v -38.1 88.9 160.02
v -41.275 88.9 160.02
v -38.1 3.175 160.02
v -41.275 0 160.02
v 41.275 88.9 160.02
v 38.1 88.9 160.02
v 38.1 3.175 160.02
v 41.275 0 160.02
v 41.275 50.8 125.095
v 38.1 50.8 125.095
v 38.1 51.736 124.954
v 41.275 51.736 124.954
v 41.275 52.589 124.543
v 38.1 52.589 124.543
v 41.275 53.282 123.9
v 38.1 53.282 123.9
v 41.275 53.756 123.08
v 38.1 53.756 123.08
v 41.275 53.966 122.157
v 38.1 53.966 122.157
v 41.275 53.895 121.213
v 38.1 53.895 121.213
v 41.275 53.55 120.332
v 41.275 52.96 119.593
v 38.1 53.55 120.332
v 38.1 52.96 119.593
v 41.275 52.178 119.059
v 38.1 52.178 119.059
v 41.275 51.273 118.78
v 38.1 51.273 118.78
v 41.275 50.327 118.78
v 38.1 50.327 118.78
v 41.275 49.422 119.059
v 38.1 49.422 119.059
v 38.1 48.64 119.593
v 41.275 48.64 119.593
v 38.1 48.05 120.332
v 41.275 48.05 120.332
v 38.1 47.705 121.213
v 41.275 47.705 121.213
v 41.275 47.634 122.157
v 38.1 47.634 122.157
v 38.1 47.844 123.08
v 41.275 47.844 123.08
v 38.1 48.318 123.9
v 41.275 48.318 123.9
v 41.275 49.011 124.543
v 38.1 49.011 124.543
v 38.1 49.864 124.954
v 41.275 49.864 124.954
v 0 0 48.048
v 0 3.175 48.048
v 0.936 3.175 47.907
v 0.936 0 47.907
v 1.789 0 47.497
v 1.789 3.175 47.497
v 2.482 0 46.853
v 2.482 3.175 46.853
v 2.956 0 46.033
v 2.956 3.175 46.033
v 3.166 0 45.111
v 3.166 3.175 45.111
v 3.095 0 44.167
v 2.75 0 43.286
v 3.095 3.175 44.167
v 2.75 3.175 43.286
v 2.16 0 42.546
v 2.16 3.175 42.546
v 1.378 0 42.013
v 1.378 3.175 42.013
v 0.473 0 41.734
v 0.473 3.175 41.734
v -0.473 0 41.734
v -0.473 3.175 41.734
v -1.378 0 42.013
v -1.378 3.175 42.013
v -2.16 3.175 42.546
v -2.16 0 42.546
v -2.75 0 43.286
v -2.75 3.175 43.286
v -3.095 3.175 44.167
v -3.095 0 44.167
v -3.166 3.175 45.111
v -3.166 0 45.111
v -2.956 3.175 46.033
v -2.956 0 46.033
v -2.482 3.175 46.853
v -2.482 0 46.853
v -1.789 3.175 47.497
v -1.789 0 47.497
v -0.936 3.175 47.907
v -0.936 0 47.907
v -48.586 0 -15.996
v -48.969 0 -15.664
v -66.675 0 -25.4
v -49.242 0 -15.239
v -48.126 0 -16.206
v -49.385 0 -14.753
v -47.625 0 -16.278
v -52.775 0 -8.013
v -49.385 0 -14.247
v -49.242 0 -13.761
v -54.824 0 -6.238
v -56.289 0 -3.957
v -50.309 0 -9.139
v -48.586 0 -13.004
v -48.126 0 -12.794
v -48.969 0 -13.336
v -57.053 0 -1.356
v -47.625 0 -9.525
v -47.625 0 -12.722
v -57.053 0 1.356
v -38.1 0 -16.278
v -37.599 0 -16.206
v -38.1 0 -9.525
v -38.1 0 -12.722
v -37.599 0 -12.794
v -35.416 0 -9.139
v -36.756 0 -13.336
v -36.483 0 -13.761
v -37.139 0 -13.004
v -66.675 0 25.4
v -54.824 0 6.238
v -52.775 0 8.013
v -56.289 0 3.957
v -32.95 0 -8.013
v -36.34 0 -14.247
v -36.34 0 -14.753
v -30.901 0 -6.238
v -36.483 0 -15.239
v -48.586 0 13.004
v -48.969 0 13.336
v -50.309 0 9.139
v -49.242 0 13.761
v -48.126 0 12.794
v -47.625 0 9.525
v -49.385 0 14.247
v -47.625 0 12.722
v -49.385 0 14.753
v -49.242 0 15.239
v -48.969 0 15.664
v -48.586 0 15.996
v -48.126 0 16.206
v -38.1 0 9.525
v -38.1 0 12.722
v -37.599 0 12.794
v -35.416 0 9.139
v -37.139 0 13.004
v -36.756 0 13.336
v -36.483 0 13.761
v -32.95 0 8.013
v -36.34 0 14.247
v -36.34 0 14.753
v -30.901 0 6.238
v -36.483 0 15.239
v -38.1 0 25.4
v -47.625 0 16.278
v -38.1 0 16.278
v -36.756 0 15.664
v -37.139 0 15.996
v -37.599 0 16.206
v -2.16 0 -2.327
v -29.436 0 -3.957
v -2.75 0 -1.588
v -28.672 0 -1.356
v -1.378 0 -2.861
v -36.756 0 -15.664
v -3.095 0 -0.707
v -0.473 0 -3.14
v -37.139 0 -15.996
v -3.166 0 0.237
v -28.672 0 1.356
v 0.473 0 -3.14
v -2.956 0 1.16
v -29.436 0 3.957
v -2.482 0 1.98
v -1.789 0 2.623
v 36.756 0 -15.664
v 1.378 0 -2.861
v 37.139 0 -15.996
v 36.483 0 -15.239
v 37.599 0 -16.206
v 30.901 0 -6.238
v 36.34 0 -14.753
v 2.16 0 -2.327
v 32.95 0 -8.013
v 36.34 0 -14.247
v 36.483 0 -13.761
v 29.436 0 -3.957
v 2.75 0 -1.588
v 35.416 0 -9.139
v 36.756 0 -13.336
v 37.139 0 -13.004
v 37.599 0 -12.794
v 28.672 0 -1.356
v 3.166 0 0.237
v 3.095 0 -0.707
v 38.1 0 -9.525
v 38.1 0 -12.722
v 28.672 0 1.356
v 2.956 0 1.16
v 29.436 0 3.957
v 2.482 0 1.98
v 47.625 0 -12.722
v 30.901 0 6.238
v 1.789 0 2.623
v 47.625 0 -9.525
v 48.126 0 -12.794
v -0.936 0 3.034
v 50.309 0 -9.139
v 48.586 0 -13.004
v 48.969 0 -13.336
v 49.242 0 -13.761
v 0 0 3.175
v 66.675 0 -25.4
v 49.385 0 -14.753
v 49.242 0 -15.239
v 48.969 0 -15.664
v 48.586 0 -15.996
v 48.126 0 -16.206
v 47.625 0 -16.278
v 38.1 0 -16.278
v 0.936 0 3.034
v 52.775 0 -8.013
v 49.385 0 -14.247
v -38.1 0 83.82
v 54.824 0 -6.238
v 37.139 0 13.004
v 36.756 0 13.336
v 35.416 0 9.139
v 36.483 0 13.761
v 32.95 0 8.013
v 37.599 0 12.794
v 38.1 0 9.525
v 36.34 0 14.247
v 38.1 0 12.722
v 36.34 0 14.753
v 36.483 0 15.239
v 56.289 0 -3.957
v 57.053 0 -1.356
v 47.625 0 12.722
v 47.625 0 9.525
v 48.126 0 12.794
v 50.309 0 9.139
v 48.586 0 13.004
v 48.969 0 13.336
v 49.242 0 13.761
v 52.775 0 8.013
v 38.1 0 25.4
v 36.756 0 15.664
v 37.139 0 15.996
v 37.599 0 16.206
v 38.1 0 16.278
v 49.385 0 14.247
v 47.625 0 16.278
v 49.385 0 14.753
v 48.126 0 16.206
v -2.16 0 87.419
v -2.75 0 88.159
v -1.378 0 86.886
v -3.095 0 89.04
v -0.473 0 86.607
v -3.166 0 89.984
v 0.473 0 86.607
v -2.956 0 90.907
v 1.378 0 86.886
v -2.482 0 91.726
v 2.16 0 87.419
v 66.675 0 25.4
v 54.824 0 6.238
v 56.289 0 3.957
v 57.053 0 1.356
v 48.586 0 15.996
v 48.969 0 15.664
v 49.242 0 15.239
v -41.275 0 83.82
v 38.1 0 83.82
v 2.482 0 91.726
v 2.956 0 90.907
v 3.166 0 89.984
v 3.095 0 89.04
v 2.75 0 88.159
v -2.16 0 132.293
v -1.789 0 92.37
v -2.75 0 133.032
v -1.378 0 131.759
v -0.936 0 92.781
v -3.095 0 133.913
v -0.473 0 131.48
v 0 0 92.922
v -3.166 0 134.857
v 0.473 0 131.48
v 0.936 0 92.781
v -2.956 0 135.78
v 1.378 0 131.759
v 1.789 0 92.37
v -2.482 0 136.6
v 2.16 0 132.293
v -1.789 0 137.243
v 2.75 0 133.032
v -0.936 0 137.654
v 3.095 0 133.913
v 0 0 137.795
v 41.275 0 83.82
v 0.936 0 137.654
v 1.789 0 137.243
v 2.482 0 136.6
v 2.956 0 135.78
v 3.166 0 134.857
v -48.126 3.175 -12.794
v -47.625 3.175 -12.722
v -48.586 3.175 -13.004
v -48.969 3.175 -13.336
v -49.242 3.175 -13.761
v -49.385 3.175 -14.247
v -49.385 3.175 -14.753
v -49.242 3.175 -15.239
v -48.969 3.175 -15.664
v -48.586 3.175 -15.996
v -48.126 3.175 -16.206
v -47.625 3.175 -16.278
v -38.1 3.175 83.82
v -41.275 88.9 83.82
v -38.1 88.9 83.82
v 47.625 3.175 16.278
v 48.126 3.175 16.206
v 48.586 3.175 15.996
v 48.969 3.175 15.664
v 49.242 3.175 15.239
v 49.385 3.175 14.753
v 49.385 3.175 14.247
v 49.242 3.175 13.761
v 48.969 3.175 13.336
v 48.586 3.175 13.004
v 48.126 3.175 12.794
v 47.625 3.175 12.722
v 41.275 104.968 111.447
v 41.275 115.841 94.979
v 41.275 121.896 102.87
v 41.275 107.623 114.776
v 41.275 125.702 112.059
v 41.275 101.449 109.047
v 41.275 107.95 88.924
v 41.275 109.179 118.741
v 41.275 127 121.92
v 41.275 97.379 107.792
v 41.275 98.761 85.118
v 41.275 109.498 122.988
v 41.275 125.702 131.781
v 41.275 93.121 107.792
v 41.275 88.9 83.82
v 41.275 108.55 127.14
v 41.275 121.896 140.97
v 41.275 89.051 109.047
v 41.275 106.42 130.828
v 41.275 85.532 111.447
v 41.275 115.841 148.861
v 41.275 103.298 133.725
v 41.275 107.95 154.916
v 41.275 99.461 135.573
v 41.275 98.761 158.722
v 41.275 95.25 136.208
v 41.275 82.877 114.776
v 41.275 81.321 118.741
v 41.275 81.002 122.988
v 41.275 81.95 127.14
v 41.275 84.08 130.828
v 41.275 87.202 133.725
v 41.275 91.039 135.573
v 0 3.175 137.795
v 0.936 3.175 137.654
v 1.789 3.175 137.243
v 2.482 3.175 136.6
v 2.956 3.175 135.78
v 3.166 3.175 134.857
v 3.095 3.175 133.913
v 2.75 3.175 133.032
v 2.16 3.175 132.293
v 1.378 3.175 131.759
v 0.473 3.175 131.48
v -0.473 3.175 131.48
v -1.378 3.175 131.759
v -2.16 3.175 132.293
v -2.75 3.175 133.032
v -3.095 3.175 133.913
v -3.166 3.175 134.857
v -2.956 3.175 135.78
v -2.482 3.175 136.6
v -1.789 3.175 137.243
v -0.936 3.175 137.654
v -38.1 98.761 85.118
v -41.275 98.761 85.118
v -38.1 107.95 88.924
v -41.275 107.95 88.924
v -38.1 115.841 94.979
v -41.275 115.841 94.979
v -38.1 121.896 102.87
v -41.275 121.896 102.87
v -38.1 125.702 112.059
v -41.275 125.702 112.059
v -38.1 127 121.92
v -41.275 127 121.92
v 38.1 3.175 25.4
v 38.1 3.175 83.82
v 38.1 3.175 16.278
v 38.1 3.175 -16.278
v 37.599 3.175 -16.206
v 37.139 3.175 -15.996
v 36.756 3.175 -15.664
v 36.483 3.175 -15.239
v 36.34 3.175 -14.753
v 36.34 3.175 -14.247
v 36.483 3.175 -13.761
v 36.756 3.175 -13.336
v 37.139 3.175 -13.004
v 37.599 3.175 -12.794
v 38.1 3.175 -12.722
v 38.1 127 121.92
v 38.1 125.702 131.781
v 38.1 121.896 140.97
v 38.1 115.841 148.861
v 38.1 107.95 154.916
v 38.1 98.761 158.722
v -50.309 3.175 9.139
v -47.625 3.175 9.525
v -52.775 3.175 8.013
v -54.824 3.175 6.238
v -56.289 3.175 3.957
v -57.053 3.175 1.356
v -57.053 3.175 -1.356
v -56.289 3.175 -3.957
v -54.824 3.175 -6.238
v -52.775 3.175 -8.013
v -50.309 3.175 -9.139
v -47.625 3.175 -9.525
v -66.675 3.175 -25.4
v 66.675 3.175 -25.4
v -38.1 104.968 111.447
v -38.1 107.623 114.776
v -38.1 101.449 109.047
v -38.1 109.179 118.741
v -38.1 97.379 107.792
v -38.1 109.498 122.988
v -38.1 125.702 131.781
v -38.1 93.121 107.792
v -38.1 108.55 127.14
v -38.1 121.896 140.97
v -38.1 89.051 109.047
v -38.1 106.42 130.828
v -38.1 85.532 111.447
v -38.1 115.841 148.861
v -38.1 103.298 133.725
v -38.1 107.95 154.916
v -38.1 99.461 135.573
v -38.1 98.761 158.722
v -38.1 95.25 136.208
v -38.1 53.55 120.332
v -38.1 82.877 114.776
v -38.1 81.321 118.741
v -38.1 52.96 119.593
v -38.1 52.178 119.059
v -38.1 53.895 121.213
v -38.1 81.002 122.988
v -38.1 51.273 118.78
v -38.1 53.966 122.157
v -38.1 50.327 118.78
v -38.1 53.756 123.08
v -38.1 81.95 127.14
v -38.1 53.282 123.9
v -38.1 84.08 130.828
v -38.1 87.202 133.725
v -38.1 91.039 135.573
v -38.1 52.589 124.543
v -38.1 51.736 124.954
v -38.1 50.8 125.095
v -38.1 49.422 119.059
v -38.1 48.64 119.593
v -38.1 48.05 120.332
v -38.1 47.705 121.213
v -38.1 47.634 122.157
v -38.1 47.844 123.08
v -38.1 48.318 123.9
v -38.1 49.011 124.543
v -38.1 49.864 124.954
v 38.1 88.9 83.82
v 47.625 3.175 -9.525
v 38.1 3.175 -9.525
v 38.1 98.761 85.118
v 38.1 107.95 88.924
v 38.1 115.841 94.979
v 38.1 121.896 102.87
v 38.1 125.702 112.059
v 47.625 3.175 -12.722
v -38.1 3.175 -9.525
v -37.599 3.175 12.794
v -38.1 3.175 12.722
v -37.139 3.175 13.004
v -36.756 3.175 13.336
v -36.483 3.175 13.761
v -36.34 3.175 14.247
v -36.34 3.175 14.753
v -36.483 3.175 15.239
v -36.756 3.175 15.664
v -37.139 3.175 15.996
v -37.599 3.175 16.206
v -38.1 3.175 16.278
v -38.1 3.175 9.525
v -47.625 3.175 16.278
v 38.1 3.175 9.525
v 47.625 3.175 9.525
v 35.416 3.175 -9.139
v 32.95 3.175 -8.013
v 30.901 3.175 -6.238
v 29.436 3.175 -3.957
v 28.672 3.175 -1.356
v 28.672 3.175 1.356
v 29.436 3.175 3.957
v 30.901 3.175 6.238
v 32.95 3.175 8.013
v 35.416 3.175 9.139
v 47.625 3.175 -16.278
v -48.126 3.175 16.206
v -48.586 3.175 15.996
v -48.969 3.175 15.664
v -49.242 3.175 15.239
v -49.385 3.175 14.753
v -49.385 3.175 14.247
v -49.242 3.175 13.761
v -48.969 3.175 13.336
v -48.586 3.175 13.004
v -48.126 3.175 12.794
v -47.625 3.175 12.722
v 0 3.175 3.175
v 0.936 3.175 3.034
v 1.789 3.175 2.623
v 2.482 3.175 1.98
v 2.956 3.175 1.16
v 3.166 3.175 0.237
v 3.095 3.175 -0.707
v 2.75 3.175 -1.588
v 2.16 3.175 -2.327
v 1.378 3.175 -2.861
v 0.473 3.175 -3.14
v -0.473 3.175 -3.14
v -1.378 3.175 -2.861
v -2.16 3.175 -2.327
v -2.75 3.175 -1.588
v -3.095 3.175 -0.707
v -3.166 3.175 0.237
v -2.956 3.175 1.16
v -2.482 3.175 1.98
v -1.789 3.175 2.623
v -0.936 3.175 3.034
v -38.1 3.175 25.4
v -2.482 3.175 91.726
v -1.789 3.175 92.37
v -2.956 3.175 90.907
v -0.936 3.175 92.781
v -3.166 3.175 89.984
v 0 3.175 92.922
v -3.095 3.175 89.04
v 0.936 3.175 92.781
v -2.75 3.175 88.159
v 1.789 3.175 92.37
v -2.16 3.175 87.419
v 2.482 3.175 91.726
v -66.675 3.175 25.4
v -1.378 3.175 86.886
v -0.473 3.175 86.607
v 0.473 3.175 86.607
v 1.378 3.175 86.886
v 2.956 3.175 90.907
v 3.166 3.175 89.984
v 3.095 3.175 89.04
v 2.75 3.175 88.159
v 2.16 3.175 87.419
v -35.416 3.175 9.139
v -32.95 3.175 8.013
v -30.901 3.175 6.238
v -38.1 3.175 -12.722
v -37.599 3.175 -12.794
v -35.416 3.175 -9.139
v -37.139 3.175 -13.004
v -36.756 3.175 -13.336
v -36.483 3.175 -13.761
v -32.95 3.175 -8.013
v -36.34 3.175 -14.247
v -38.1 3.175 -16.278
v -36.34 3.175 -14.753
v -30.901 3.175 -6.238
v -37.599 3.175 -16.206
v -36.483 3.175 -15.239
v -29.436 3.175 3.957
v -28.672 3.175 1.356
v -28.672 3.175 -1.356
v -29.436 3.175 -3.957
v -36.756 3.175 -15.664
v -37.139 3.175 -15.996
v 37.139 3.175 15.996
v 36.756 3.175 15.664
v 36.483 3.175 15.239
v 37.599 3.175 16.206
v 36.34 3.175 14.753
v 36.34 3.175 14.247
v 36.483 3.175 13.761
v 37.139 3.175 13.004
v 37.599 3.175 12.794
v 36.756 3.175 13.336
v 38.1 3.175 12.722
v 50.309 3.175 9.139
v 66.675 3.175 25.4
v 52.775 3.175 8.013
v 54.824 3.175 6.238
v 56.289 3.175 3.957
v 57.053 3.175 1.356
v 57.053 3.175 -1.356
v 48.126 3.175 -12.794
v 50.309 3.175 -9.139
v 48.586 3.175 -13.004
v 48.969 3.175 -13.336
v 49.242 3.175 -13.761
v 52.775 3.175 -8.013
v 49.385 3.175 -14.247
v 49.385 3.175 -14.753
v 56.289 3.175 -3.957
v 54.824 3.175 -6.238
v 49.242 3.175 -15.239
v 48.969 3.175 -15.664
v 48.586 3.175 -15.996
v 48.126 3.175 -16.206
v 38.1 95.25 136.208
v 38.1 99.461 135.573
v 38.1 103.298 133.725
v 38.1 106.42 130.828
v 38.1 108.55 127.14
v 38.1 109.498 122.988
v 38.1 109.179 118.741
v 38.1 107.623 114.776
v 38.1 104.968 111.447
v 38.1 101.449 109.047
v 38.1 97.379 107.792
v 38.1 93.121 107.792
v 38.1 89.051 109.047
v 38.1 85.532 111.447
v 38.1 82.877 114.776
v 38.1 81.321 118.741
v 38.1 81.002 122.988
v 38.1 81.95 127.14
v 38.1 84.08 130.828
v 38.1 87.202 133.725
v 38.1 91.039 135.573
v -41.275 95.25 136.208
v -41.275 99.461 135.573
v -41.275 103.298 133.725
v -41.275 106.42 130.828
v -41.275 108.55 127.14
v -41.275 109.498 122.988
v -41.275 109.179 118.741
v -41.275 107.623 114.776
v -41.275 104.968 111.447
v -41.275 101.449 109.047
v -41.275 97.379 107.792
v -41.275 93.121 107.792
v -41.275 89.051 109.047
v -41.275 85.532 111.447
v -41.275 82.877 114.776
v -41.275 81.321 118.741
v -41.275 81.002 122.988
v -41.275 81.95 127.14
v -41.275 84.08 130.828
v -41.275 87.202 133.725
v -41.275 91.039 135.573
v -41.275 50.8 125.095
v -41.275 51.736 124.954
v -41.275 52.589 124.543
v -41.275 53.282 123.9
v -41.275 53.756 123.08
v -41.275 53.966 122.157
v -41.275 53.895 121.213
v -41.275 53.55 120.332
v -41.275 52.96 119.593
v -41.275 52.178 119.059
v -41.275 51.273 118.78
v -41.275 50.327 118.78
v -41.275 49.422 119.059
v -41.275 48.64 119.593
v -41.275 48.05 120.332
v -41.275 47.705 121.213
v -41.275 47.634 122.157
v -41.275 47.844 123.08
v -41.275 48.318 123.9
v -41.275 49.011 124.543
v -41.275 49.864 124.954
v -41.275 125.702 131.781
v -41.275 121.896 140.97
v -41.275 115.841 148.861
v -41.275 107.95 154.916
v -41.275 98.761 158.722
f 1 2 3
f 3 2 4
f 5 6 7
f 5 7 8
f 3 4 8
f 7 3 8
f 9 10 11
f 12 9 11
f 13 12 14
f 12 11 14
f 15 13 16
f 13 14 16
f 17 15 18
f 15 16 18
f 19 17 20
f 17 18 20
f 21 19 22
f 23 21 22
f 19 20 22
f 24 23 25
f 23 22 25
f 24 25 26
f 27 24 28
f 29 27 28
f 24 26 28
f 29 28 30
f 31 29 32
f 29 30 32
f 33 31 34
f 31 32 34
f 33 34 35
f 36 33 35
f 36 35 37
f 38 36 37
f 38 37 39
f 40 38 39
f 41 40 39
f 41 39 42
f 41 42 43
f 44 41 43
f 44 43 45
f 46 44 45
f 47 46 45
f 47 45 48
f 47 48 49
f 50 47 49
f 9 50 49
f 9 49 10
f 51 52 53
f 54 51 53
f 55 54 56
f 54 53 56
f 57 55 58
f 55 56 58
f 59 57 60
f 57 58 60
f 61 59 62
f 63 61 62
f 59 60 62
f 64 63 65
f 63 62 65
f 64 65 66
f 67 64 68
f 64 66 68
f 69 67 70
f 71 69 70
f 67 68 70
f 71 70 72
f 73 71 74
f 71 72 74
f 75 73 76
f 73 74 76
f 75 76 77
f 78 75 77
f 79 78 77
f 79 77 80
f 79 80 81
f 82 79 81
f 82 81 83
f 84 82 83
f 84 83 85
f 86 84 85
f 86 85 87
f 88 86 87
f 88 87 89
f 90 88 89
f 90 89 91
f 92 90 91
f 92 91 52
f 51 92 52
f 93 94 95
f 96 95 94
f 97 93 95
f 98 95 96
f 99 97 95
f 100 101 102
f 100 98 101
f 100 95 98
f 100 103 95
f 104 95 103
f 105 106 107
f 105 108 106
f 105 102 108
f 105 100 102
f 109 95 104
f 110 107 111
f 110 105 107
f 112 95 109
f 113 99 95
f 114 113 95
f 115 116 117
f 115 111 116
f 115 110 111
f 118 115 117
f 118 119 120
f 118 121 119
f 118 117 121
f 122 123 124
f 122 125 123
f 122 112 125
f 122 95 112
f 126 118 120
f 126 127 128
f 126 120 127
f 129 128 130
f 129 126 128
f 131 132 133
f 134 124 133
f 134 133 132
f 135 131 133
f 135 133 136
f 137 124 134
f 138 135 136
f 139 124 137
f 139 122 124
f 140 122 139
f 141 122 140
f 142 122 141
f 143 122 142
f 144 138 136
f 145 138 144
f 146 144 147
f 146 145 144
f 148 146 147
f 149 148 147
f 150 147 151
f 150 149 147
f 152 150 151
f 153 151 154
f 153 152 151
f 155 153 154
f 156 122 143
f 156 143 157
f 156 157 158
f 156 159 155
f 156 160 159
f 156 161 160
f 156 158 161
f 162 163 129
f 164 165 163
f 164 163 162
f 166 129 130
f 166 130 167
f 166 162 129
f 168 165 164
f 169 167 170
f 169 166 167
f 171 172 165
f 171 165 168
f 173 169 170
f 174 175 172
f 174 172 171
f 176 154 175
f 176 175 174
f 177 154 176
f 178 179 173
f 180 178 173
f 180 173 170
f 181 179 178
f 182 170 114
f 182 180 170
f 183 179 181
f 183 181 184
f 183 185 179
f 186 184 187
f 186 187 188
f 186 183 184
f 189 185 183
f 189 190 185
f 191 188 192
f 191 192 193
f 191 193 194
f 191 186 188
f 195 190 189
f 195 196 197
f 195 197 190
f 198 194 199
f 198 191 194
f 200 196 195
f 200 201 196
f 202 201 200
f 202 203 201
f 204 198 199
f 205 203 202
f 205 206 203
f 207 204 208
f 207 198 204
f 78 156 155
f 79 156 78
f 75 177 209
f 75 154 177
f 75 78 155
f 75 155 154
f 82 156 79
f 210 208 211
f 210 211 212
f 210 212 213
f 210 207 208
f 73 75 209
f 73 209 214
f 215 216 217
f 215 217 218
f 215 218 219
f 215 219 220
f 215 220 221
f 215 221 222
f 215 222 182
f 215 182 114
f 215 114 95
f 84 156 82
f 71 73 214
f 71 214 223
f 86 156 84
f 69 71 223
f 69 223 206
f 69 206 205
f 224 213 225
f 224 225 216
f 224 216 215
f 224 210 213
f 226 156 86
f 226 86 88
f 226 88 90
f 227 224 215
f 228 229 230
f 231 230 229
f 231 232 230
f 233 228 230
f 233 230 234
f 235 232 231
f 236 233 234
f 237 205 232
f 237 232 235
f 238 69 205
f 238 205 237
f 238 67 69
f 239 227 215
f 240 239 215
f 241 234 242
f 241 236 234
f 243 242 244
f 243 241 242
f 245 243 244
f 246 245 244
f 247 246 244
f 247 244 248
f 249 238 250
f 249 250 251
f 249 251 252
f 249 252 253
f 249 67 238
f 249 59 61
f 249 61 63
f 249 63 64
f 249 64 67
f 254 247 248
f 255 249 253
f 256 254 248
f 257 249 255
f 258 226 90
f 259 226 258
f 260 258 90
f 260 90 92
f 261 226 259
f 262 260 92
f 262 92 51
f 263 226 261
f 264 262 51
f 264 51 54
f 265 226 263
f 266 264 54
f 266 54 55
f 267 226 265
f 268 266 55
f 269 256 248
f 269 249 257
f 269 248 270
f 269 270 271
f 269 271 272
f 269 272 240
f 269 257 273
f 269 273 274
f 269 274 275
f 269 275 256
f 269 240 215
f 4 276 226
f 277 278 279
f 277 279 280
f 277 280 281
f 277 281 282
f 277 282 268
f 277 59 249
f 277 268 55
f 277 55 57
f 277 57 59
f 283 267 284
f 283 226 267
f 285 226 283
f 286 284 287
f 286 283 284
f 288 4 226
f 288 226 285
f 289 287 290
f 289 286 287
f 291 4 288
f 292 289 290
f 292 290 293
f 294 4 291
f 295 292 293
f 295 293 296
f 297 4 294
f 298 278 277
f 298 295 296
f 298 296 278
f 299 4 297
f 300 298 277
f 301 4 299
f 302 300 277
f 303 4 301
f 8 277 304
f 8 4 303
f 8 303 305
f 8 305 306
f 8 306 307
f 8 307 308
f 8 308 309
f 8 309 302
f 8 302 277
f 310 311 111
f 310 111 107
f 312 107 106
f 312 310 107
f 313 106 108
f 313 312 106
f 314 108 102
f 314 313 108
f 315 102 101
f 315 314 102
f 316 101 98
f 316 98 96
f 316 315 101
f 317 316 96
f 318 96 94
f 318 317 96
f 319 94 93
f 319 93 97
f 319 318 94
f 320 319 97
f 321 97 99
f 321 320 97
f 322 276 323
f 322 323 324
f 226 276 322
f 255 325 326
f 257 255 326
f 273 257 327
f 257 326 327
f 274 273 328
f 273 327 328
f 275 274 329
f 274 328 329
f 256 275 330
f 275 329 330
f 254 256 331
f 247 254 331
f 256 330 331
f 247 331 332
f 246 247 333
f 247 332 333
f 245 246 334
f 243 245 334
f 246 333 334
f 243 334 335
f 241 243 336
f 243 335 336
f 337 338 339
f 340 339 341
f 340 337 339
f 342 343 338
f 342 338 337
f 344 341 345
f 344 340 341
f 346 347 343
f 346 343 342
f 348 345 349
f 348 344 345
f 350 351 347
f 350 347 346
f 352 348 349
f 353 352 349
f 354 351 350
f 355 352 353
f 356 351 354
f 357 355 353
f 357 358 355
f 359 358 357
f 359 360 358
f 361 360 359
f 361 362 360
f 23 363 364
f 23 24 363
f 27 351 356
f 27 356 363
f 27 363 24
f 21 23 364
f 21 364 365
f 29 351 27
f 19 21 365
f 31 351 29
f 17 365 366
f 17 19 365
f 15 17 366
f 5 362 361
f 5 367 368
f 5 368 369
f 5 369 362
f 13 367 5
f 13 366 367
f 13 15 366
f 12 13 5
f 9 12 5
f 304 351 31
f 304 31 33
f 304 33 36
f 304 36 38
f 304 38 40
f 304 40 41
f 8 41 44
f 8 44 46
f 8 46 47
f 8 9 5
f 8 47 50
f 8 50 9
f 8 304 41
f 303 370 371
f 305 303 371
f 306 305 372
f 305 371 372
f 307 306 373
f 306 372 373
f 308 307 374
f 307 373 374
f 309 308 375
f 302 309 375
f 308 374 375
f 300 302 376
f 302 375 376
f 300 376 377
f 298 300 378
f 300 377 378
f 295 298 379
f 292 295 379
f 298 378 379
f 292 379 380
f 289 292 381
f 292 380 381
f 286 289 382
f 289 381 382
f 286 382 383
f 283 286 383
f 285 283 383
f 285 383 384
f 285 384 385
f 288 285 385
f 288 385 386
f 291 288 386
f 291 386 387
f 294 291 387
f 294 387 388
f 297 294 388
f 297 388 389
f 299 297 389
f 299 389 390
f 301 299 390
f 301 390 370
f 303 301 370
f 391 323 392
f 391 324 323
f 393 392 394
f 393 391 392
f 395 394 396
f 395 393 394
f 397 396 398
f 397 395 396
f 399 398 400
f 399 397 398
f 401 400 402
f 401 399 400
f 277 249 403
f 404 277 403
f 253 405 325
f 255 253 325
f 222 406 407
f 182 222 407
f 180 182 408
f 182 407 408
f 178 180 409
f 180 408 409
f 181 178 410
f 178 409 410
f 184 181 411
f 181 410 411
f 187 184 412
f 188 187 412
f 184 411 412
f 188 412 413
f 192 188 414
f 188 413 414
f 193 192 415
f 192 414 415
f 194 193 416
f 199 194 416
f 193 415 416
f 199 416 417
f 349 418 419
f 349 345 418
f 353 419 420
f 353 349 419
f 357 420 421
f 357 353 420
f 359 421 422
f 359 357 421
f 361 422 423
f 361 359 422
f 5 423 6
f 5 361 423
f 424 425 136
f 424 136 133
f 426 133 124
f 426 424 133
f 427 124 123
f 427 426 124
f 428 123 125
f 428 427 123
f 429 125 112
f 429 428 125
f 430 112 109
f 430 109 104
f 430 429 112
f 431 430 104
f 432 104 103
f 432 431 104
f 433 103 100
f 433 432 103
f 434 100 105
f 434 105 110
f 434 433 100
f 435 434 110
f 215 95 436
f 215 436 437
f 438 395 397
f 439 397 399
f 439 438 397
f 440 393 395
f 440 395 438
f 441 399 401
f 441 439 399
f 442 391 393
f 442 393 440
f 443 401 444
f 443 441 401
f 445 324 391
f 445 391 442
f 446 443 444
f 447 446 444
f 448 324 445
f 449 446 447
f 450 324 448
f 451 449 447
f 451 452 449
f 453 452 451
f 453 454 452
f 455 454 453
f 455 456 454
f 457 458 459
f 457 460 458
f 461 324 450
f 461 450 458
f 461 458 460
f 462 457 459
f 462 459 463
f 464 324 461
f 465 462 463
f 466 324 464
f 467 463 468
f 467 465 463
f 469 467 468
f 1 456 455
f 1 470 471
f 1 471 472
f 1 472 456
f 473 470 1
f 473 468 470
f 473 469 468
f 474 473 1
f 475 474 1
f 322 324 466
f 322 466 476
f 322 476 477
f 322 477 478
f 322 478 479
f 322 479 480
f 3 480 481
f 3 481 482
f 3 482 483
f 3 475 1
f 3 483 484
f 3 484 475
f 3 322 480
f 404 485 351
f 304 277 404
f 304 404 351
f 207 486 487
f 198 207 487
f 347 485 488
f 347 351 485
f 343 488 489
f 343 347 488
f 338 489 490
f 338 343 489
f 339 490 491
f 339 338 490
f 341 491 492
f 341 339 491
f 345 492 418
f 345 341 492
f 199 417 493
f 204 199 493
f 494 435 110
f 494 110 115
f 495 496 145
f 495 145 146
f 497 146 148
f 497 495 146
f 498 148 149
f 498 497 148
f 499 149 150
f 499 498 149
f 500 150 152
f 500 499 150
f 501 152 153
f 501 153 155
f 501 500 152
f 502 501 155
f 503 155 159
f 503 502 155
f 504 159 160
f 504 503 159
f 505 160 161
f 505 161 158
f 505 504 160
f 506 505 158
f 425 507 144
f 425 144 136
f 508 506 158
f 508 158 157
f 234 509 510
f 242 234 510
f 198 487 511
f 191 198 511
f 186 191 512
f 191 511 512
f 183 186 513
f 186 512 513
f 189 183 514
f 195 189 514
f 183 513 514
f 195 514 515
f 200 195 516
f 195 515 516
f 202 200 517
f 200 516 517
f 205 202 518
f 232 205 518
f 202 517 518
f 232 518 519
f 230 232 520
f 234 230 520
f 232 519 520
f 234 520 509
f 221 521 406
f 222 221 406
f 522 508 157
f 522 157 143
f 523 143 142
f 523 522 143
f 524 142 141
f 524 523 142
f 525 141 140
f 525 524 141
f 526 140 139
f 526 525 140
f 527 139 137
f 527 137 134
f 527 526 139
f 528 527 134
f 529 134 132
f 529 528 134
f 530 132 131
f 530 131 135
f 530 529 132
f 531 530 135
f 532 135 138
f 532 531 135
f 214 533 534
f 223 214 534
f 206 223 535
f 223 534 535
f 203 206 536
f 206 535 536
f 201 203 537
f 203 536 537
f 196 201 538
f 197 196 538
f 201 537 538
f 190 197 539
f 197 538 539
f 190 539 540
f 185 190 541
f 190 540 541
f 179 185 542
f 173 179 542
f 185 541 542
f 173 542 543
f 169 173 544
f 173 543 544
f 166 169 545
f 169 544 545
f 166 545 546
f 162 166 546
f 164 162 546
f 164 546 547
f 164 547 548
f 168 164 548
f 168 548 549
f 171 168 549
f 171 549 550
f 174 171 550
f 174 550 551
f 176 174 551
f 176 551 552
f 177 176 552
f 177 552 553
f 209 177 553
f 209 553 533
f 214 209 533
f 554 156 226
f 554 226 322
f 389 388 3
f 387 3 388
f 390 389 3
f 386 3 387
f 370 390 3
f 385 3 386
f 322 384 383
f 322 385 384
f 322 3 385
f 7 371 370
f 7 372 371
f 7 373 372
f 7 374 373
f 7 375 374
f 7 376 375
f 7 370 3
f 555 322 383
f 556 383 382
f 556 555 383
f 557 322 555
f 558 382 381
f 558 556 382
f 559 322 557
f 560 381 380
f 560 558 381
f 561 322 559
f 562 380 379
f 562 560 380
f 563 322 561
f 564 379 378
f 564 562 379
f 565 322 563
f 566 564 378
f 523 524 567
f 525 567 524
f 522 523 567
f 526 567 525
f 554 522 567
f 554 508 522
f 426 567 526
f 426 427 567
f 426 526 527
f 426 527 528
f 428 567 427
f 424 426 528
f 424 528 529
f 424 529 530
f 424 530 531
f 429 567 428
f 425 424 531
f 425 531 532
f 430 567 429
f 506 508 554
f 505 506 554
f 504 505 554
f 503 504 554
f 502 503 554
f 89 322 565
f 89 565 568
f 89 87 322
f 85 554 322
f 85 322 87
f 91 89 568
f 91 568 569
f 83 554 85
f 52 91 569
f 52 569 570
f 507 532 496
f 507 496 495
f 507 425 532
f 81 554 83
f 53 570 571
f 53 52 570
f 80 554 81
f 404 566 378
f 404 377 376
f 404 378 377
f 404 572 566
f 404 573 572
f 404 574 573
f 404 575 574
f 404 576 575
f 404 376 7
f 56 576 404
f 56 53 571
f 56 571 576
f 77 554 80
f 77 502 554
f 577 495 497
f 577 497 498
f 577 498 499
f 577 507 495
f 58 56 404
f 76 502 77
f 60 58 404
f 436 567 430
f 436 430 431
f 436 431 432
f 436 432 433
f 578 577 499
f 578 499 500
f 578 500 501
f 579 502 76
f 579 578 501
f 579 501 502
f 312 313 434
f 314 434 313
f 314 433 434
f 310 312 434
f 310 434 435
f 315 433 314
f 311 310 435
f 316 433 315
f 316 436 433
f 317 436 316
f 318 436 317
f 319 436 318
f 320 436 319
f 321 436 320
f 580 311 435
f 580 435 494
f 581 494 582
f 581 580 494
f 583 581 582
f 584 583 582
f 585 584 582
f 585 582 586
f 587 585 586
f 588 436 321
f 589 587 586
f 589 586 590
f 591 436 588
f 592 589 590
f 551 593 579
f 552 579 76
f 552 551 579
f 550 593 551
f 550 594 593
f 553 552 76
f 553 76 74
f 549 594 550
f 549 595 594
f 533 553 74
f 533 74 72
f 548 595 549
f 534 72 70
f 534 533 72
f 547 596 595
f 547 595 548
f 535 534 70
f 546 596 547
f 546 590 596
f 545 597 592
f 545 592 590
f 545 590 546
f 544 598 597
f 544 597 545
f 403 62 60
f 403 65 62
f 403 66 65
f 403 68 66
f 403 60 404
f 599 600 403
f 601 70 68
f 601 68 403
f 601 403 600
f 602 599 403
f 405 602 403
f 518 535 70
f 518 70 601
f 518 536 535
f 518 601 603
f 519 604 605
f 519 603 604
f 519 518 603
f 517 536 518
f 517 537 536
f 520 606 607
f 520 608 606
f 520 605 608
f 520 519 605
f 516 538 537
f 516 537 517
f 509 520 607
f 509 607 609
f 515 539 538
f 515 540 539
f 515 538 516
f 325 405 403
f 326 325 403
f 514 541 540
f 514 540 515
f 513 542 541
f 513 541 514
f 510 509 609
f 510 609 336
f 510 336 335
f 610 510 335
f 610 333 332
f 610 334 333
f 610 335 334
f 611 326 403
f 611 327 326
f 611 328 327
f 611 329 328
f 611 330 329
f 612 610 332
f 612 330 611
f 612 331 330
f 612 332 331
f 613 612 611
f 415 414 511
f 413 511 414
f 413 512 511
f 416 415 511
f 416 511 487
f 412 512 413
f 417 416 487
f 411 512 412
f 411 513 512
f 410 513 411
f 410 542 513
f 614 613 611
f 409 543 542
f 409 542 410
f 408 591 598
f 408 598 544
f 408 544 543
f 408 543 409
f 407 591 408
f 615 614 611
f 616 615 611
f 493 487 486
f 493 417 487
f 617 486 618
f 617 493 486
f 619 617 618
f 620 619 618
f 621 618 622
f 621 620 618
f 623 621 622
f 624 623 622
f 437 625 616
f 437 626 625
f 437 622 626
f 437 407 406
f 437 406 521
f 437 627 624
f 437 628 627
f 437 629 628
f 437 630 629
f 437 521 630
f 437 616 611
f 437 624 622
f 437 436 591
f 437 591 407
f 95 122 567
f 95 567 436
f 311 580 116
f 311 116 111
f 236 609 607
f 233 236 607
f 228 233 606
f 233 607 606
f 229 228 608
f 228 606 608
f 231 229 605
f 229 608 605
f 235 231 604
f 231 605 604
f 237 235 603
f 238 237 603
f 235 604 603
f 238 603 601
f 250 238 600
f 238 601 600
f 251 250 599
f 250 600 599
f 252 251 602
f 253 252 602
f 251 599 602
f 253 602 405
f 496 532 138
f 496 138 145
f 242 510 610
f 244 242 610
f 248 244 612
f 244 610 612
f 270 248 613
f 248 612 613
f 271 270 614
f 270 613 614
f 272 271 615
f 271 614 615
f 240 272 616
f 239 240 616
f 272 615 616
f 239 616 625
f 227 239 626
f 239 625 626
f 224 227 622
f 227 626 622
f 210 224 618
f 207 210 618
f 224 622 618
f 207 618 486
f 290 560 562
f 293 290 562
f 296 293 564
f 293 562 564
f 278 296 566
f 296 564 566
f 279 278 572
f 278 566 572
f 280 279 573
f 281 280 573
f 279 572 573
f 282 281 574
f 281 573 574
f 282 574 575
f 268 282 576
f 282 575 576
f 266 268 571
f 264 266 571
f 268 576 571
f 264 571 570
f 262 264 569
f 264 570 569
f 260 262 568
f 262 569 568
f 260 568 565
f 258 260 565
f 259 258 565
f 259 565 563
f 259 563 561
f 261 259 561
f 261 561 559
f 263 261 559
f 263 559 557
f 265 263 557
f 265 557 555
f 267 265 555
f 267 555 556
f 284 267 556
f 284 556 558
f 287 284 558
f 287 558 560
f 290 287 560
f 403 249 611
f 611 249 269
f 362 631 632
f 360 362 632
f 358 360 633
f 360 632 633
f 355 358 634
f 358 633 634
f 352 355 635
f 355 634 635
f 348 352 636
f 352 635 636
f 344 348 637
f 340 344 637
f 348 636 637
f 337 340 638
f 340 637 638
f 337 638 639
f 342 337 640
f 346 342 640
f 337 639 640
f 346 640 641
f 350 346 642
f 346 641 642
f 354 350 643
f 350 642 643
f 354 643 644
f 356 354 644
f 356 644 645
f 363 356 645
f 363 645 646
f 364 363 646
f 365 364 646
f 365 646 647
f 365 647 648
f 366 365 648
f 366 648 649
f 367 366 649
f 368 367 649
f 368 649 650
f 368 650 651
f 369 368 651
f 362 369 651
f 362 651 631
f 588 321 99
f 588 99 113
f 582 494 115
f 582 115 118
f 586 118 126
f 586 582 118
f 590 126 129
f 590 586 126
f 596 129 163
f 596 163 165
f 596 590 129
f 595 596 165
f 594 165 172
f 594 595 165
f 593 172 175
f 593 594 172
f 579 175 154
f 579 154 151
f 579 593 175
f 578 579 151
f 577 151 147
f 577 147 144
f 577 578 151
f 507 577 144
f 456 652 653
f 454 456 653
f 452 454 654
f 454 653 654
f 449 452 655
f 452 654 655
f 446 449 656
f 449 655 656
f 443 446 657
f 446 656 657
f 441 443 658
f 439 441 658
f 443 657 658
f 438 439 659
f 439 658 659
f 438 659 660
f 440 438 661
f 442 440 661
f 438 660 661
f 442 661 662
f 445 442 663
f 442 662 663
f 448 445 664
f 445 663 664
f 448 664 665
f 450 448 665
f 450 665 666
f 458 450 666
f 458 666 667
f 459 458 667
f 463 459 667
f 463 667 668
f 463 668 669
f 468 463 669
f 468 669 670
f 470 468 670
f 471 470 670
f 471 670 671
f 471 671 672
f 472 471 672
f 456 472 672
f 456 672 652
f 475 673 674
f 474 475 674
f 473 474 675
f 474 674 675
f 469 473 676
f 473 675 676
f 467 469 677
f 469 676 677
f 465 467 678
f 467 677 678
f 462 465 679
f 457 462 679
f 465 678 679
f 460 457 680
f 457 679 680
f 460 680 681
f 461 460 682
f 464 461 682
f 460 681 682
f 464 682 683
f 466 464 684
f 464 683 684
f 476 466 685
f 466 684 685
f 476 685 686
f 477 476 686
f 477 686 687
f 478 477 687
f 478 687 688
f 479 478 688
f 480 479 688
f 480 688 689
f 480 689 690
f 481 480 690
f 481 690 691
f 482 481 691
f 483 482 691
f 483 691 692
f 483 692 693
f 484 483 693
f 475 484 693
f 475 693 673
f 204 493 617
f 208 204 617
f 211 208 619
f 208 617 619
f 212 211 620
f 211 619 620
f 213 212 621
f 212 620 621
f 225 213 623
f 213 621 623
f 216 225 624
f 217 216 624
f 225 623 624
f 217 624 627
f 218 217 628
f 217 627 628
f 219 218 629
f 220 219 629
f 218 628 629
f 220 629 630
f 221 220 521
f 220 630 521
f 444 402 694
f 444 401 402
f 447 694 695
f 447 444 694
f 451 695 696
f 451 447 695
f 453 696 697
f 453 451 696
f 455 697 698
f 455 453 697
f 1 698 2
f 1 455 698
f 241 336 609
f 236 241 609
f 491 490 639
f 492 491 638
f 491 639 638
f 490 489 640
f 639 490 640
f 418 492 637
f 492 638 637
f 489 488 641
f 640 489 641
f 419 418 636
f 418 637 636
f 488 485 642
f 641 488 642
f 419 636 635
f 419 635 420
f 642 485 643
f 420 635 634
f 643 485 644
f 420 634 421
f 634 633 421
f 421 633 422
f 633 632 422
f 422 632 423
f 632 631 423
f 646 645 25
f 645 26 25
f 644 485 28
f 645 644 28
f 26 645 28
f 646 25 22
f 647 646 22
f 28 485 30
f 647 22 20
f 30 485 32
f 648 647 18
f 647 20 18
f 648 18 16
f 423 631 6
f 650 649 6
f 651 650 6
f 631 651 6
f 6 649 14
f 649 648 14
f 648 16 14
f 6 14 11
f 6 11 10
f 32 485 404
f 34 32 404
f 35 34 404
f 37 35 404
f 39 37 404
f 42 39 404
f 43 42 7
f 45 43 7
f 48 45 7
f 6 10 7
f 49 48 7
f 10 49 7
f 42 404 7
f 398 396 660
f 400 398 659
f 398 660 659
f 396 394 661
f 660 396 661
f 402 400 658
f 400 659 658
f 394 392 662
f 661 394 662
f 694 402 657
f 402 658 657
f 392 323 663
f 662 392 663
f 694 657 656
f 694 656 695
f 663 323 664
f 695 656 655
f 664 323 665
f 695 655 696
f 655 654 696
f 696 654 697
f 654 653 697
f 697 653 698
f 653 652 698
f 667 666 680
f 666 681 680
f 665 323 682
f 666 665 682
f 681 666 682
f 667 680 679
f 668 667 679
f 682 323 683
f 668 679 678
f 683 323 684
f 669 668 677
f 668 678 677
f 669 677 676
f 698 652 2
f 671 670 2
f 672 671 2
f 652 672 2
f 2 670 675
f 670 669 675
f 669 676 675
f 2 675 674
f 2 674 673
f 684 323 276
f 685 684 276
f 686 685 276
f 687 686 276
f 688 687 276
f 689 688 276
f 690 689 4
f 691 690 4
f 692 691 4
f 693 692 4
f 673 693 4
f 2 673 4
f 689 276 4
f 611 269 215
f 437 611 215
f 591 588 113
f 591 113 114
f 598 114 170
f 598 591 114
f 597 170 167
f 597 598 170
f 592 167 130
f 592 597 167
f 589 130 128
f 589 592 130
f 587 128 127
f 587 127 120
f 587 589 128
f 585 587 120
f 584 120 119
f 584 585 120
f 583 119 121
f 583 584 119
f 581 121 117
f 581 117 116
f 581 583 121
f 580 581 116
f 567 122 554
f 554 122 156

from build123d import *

# Parameters (mm, degrees)
SKETCH1_W           = 133.35
SKETCH1_H           = 50.8
BOSS_EXTRUDE1_DEPTH = 3.175
CUT_EXTRUDE1_DEPTH  = 3.175
SKETCH4_W           = 76.2
SKETCH4_H           = 3.175
BOSS_EXTRUDE2_DEPTH = 134.62
SKETCH5_W           = 3.175
SKETCH5_H           = 76.2
BOSS_EXTRUDE3_DEPTH = 127
FILLET1_R           = 38.1
SKETCH6_R           = 14.2875
SKETCH6_R_2         = 3.175
CUT_EXTRUDE3_DEPTH  = 232.059738812
SKETCH3_R           = 3.175
CUT_EXTRUDE2_DEPTH  = 214.036585238


with BuildPart() as part:
    # Sketch1 → Boss-Extrude1 (new body)
    with BuildSketch(Plane(origin=(0, 0, 0), x_dir=(1, 0, 0), z_dir=(0, 1, 0))):
        Rectangle(SKETCH1_W, SKETCH1_H)
    extrude(amount=BOSS_EXTRUDE1_DEPTH)

    # Sketch2 → Cut-Extrude1 (cut)
    with BuildSketch(Plane(origin=(0, 3.175, 0), x_dir=(1, 0, 0), z_dir=(0, 1, 0))):
        with BuildLine():
            Line((-47.625, -12.722), (-38.1, -12.722))
            ThreePointArc((-38.1, -12.722), (-36.322, -14.5), (-38.1, -16.278))
            Line((-38.1, -16.278), (-47.625, -16.278))
            ThreePointArc((-47.625, -16.278), (-49.403, -14.5), (-47.625, -12.722))
        make_face()
        with BuildLine():
            Line((-38.1, 12.722), (-47.625, 12.722))
            ThreePointArc((-47.625, 12.722), (-49.403, 14.5), (-47.625, 16.278))
            Line((-47.625, 16.278), (-38.1, 16.278))
            ThreePointArc((-38.1, 16.278), (-36.322, 14.5), (-38.1, 12.722))
        make_face()
        with BuildLine():
            Line((-38.1, -9.525), (-47.625, -9.525))
            ThreePointArc((-47.625, -9.525), (-57.15, 0), (-47.625, 9.525))
            Line((-47.625, 9.525), (-38.1, 9.525))
            ThreePointArc((-38.1, 9.525), (-28.575, 0), (-38.1, -9.525))
        make_face()
    cut_extrude1 = extrude(amount=-CUT_EXTRUDE1_DEPTH, mode=Mode.SUBTRACT)

    # Mirror1: Cut-Extrude1 across plane
    add(cut_extrude1.mirror(Plane(origin=(0, 0, 0), x_dir=(0, 0, 1), z_dir=(1, 0, 0))), mode=Mode.SUBTRACT)

    # Sketch4 → Boss-Extrude2 (add)
    with BuildSketch(Plane.XY.offset(25.4)):
        with Locations((0, 1.5875)):
            Rectangle(SKETCH4_W, SKETCH4_H)
    extrude(amount=BOSS_EXTRUDE2_DEPTH)

    # Sketch5 → Boss-Extrude3 (add)
    with BuildSketch(Plane.XZ):
        with Locations((39.6875, 121.92)):
            Rectangle(SKETCH5_W, SKETCH5_H)
        with Locations((-39.6875, 121.92)):
            Rectangle(SKETCH5_W, SKETCH5_H)
    extrude(amount=-BOSS_EXTRUDE3_DEPTH)

    # Fillet1
    fillet1_edges = [part.edges().sort_by_distance(p)[0] for p in [
        (39.6875, 127, 160.02),
        (-39.6875, 127, 160.02),
        (39.6875, 127, 83.82),
        (-39.6875, 127, 83.82),
    ]]
    fillet(fillet1_edges, radius=FILLET1_R - 0.0001)  # a hair under: the kernel refuses the full size

    # Sketch6 → Cut-Extrude3 (cut, through all)
    with BuildSketch(Plane.ZY.offset(41.275)):
        with Locations((121.92, 95.25)):
            Circle(SKETCH6_R)
        with Locations((121.92, 50.8)):
            Circle(SKETCH6_R_2)
    extrude(amount=-CUT_EXTRUDE3_DEPTH, mode=Mode.SUBTRACT)

    # Sketch3 → Cut-Extrude2 (cut, through all)
    with BuildSketch(Plane(origin=(0, 3.175, 0), x_dir=(1, 0, 0), z_dir=(0, 1, 0))):
        with Locations(Location((0, 0, 0), (0, 0, 270))):
            Circle(SKETCH3_R)
        with Locations(Location((0, -44.873333333, 0), (0, 0, 270))):
            Circle(SKETCH3_R)
        with Locations(Location((0, -89.746666667, 0), (0, 0, 270))):
            Circle(SKETCH3_R)
        with Locations(Location((0, -134.62, 0), (0, 0, 270))):
            Circle(SKETCH3_R)
    extrude(amount=-CUT_EXTRUDE2_DEPTH, mode=Mode.SUBTRACT)


solid = part.part
